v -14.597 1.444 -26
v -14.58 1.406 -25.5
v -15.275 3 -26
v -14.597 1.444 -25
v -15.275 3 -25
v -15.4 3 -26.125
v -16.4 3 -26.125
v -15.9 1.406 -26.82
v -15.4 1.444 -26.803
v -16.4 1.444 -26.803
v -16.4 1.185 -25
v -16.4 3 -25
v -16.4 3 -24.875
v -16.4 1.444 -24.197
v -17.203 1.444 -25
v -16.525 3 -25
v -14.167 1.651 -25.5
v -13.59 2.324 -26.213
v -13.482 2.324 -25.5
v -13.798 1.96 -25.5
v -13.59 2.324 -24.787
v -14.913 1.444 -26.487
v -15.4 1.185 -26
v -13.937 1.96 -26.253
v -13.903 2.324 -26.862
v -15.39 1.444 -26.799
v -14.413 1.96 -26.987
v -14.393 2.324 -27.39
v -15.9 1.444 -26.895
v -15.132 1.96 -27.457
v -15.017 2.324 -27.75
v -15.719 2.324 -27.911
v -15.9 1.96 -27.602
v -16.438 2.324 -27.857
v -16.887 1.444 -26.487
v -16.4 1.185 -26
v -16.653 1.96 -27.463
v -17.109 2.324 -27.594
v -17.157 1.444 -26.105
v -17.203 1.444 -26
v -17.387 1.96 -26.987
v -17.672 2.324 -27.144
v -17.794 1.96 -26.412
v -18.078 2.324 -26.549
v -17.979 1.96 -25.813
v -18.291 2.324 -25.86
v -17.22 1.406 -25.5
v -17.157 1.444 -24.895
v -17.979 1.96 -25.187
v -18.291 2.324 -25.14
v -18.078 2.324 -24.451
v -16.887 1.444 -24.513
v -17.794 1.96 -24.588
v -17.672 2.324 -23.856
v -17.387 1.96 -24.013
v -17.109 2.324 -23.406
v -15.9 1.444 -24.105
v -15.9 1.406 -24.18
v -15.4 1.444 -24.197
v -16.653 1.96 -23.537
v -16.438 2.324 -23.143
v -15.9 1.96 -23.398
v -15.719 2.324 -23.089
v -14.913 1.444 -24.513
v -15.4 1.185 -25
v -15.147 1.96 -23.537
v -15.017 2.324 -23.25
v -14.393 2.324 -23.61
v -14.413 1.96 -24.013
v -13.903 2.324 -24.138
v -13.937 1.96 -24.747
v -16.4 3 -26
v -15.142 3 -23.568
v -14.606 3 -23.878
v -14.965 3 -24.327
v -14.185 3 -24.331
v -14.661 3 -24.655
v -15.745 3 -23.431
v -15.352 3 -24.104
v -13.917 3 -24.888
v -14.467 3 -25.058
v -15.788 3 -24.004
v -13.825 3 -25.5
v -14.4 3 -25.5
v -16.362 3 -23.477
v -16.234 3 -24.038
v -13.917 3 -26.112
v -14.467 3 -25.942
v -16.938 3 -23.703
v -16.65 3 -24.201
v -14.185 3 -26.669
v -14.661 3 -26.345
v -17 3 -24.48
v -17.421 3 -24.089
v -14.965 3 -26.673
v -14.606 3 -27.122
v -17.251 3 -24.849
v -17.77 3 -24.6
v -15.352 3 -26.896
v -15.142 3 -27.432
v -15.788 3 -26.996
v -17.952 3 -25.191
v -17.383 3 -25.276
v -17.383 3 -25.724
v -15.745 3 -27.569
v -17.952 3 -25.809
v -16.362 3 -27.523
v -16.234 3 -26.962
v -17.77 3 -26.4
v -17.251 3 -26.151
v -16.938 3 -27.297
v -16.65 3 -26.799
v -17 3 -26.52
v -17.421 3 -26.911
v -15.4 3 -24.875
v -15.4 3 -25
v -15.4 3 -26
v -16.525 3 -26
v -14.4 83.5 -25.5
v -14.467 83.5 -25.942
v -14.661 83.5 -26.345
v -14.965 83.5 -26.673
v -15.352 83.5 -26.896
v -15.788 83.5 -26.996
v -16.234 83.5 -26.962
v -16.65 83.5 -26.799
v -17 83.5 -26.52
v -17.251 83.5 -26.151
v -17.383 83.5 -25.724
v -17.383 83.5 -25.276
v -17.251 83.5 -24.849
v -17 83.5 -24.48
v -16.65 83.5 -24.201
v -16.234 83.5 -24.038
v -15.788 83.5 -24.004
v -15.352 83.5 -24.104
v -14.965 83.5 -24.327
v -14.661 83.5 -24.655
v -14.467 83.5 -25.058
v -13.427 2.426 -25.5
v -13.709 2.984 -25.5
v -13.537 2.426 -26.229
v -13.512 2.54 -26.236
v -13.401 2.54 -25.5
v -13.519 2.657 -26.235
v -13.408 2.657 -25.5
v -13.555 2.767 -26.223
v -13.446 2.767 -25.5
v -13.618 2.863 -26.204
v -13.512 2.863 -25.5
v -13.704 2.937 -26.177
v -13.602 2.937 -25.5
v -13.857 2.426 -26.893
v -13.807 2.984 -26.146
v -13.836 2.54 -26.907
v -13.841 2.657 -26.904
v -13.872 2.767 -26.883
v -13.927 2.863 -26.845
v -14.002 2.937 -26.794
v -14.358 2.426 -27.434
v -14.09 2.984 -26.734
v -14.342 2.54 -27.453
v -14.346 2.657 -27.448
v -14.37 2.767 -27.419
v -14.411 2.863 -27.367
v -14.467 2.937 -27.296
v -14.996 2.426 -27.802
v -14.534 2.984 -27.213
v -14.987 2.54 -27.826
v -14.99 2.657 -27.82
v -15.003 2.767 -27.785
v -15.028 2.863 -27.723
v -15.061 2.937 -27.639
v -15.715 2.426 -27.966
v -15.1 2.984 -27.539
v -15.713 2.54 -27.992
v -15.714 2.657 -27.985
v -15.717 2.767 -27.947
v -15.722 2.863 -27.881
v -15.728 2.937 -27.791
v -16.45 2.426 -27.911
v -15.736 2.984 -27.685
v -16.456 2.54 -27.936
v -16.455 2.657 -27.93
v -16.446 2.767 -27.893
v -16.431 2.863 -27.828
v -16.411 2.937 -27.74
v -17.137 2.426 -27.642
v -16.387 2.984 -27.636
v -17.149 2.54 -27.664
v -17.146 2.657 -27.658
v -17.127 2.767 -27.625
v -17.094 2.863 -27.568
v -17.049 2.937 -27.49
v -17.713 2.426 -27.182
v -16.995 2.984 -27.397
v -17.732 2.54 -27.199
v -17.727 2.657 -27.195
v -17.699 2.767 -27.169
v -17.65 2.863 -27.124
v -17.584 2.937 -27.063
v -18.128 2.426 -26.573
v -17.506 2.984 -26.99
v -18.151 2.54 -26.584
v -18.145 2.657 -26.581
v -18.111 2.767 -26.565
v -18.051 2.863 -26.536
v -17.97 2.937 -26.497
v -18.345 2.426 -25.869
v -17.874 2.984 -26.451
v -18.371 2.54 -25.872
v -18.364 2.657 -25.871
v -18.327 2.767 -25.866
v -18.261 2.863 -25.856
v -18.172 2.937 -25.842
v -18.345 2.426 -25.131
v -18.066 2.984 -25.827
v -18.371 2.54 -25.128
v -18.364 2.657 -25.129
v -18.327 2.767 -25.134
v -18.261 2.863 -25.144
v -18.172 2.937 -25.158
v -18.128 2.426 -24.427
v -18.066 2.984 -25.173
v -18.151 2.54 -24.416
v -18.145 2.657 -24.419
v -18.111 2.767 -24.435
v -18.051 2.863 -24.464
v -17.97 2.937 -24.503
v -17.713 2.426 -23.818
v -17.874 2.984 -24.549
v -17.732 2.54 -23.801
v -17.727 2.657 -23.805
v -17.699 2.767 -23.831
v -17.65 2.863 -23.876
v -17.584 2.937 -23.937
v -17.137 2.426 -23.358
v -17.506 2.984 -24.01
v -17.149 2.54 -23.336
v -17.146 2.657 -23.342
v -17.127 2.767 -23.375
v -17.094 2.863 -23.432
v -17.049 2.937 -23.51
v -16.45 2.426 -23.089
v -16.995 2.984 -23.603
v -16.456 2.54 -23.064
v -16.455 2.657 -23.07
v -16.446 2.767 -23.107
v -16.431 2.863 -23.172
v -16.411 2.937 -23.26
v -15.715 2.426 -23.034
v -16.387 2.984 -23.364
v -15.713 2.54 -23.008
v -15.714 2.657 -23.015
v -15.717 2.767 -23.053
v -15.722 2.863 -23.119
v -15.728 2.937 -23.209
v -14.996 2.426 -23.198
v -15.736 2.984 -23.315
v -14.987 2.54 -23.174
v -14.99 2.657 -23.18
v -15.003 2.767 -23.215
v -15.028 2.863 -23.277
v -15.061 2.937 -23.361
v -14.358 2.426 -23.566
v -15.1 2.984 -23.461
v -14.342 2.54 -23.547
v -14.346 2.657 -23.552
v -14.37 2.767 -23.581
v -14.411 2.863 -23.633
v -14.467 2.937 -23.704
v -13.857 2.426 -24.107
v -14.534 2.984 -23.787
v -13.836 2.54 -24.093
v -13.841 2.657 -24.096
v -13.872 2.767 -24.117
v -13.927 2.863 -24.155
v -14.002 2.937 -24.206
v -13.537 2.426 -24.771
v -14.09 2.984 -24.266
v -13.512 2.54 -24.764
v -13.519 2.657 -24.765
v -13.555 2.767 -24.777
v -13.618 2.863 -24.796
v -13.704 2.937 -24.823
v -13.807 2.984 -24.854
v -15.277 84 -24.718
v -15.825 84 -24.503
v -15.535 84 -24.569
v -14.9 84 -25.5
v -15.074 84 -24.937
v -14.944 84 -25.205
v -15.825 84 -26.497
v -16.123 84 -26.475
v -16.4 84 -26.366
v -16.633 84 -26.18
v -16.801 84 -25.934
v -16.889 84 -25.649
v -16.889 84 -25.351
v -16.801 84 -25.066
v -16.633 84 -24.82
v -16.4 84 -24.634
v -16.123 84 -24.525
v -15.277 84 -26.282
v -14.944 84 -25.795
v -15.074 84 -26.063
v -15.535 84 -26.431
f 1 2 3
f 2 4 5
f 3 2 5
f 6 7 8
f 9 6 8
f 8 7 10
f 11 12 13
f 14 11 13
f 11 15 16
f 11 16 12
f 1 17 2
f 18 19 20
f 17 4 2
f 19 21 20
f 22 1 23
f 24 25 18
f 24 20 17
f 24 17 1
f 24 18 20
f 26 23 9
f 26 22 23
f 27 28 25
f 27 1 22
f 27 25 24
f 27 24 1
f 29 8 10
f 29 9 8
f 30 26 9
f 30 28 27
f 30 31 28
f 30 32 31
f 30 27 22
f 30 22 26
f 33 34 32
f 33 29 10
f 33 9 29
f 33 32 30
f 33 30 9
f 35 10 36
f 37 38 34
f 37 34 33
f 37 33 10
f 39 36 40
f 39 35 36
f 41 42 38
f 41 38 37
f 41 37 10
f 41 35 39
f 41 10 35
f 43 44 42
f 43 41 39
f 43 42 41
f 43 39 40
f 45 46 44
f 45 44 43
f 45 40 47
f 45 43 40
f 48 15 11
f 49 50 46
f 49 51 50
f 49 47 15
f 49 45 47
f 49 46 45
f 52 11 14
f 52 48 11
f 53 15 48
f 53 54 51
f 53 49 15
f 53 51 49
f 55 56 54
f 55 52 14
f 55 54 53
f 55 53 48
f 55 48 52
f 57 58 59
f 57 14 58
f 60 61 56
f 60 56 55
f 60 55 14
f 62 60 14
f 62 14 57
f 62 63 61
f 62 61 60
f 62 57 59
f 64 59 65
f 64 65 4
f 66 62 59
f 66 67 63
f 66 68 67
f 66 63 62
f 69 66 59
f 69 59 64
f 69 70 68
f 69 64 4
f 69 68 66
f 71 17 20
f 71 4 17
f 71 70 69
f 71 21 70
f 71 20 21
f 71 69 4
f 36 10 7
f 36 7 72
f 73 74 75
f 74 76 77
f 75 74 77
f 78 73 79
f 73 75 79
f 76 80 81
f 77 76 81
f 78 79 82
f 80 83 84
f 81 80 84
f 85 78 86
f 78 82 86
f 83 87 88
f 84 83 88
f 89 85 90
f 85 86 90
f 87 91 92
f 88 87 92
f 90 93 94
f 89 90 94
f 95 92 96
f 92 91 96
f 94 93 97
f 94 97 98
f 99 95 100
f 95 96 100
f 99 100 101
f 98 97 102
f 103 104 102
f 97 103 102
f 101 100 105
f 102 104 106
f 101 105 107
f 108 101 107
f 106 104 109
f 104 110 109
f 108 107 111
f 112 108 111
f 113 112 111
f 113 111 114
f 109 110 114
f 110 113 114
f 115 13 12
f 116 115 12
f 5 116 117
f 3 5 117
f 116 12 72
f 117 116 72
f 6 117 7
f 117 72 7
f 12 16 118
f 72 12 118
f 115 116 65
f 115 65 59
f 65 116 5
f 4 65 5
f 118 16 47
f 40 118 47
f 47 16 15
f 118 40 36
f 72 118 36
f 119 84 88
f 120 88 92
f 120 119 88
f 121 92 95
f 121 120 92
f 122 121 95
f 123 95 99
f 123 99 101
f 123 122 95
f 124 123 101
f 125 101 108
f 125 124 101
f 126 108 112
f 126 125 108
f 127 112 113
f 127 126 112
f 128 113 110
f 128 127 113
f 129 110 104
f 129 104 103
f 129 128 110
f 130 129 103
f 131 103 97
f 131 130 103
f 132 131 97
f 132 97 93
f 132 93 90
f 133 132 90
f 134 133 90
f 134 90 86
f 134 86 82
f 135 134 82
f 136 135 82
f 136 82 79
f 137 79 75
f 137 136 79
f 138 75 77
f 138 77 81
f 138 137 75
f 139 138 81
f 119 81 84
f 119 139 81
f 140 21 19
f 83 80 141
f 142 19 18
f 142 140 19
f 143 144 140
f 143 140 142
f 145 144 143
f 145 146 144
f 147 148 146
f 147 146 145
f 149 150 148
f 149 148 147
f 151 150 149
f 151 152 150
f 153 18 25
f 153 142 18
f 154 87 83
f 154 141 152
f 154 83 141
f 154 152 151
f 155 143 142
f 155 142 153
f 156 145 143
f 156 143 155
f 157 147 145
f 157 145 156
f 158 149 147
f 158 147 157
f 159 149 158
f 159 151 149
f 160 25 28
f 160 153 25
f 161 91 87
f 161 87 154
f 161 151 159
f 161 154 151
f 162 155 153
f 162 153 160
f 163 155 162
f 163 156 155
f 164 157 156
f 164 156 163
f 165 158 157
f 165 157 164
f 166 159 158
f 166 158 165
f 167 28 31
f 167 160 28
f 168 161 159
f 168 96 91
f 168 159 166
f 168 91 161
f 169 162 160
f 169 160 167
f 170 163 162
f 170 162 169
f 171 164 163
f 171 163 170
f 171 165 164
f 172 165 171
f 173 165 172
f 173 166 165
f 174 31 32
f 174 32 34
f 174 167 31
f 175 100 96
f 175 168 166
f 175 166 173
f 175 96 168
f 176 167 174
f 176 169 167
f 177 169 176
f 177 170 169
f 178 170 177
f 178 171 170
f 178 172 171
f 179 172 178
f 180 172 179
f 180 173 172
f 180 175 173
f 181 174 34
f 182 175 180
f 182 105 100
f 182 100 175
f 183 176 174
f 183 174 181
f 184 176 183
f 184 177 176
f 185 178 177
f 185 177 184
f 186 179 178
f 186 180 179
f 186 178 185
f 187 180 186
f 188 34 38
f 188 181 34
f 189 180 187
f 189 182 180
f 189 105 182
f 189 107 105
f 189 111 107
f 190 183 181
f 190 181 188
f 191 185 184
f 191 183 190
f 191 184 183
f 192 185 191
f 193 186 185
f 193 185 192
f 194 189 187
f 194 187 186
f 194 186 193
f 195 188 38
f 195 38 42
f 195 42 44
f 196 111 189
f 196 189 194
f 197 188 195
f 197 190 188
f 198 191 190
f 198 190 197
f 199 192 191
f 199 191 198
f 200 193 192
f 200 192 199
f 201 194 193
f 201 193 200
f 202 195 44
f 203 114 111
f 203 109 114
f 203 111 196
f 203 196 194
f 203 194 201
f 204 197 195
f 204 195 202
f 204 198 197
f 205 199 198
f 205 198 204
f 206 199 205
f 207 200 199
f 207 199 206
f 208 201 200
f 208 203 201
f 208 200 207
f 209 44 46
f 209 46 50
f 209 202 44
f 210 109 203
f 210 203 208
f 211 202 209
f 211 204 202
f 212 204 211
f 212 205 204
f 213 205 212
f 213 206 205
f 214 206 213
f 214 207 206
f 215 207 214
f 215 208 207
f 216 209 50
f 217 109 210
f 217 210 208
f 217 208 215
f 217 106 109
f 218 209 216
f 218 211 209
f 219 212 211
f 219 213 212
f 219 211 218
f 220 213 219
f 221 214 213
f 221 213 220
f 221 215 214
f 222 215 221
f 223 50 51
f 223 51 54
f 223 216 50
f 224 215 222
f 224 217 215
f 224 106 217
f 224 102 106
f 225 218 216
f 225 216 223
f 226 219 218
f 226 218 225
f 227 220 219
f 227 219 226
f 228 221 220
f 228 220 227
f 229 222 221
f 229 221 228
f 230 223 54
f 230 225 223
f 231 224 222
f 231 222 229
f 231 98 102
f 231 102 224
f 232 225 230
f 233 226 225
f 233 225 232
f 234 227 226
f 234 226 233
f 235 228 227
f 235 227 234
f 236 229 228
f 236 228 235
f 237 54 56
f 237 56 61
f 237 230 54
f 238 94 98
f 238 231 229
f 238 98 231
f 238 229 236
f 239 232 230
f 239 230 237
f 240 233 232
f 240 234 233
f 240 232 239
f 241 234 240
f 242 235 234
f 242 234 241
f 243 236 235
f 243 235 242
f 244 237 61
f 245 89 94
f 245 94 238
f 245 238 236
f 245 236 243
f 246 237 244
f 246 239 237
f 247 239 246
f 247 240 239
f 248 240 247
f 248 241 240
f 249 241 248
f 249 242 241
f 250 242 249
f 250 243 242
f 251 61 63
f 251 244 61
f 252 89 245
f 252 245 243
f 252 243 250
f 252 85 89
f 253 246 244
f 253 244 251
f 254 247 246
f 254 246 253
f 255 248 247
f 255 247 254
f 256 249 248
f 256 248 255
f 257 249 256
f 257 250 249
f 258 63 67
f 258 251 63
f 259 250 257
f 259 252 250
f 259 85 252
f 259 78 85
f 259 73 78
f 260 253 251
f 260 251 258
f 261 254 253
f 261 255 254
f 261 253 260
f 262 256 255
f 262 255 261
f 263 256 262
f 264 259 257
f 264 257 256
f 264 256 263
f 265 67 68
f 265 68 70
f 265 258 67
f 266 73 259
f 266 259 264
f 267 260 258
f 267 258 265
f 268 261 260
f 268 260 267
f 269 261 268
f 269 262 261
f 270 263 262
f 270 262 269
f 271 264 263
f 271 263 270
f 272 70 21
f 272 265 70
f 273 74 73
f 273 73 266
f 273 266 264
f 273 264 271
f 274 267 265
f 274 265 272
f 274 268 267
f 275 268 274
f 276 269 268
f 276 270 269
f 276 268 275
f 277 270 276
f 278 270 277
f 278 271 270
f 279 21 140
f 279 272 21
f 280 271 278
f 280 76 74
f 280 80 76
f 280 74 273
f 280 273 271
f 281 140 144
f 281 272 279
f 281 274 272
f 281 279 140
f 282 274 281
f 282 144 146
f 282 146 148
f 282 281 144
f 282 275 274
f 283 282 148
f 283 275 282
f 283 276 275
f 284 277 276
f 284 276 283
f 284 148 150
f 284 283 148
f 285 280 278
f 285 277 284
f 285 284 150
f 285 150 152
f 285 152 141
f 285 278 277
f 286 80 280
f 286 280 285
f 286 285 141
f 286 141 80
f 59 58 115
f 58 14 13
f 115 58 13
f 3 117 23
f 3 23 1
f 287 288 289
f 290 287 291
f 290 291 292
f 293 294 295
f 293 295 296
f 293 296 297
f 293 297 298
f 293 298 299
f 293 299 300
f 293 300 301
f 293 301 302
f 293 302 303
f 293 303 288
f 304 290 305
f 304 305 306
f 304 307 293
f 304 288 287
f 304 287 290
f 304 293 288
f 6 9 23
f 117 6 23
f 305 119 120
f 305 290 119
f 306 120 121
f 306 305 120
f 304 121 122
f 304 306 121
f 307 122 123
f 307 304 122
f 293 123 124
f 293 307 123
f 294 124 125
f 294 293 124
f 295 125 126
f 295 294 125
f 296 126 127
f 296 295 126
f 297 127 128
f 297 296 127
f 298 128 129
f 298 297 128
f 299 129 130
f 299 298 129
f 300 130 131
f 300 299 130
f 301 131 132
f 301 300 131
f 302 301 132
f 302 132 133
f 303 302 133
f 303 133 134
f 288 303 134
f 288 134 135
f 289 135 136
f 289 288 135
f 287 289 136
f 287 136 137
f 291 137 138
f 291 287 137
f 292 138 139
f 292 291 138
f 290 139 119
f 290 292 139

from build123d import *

# Parameters (mm, degrees)
PAD009_DEPTH            = 0.5
BODY005_PLACEMENT_ANGLE = 90
PAD008_DEPTH            = 0.5


with BuildPart() as body005:
    # Sketch021 → Pad009 (new body, symmetric)
    with BuildSketch(Plane.XY):
        Polygon((-2.15, -3.5), (2.15, -3.5), (0.625, 0), (-0.625, 0), align=None)
    extrude(amount=PAD009_DEPTH, both=True)


with BuildPart() as body005_1:
    # Body005 placement: moved
    add(body005.part.rotate(Axis((0, 0, 0), (0, -1, 0)), BODY005_PLACEMENT_ANGLE))


with BuildPart() as fusion:
    # Sketch020 → Pad008 (new body, symmetric)
    with BuildSketch(Plane.XY):
        Polygon((-2.15, -3.5), (2.15, -3.5), (0.625, 0), (-0.625, 0), align=None)
    extrude(amount=PAD008_DEPTH, both=True)

    # Fusion: union Body005
    add(body005_1.part)


with BuildPart() as body007:
    # Sketch019 → Revolution (revolve)
    with BuildSketch(Plane.XY):
        with BuildLine():
            Line((1.5, 0), (1.5, 80.5))
            Line((1.5, 80.5), (1, 81))
            Line((1, 81), (0, 81))
            Line((0, 81), (0, -1.9))
            ThreePointArc((0, -1.9), (1.354762, -1.576681), (2.417511, -0.676413))
            ThreePointArc((2.417511, -0.676413), (2.454213, -0.232991), (2.075154, 0))
            Line((1.5, 0), (2.075154, 0))
        make_face()
    revolve(axis=Axis((0, 0, 0), (0, 1, 0)))

    # Cut: cut Fusion
    add(fusion.part, mode=Mode.SUBTRACT)


with BuildPart() as body007_1:
    # Cut placement: moved
    add(body007.part.moved(Location((-15.9, 3, 25.5))))


with BuildPart() as body007_2:
    # Clone001 placement: moved
    add(body007_1.part.moved(Location((15.9, 0, -25.5))))


with BuildPart() as body007_3:
    # Body007 placement: moved
    add(body007_2.part.moved(Location((-15.9, 0, -25.5))))


solid = body007_3.part
